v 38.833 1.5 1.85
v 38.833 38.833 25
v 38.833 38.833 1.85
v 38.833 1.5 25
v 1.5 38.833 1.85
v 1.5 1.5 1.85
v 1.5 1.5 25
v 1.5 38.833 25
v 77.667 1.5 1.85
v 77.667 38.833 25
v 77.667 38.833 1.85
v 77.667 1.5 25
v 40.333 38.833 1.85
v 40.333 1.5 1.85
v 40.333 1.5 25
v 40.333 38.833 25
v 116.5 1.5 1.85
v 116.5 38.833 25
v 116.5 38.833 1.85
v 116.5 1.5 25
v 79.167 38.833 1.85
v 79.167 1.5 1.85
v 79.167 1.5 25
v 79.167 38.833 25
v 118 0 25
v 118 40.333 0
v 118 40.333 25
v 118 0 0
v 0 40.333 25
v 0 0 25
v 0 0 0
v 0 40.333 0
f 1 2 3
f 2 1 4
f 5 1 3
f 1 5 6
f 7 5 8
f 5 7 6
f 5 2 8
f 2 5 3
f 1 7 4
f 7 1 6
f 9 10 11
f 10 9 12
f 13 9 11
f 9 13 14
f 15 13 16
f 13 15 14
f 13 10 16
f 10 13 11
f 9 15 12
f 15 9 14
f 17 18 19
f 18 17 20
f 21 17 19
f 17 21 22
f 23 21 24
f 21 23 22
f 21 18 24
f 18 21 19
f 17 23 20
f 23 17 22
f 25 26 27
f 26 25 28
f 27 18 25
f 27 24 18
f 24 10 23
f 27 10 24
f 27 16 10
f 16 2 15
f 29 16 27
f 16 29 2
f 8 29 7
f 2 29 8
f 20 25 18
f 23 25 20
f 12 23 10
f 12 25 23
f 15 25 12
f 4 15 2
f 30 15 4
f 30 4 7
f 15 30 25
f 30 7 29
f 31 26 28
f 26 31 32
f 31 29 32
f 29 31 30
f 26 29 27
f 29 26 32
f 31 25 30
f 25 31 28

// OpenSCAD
// core vars
total_w=118; //mm
box_p_row=3; //amount of boxes per ro
box_wall_th=1.5; // mm width of the boxes wall
box_wall_h=25; //mm height of outer box walls
box_bot_th=1.8; // mm thickness of bottom 
smidg=0.05;

//calcs
walls_p_row=box_p_row+1;
box_wall_total_th=box_wall_th*walls_p_row;
total_inner_w=total_w-box_wall_total_th;
box_iw=total_inner_w/box_p_row;
box_ow=box_iw+box_wall_th*2;
box_h=box_ow;
box_wall_ih=box_wall_h-box_bot_th;
box_ih=box_h-box_wall_th*2;


echo("<b>aaa</b>");
echo("total width",total_w);
echo("walls per row", walls_p_row);
echo("total inner width(boxes)",total_inner_w);
echo("<b>aaa</b>");

difference(){
   cube([total_w,box_h,box_wall_h]);  
	for(c=[0:box_p_row-1])
	{   
   	translate([c*(box_ow-box_wall_th)+box_wall_th,box_wall_th,box_bot_th+smidg])
		    cube([box_iw,box_ih,box_wall_ih]);	

	}
}

//cylinder(h=my_h, r=my_r);
//
